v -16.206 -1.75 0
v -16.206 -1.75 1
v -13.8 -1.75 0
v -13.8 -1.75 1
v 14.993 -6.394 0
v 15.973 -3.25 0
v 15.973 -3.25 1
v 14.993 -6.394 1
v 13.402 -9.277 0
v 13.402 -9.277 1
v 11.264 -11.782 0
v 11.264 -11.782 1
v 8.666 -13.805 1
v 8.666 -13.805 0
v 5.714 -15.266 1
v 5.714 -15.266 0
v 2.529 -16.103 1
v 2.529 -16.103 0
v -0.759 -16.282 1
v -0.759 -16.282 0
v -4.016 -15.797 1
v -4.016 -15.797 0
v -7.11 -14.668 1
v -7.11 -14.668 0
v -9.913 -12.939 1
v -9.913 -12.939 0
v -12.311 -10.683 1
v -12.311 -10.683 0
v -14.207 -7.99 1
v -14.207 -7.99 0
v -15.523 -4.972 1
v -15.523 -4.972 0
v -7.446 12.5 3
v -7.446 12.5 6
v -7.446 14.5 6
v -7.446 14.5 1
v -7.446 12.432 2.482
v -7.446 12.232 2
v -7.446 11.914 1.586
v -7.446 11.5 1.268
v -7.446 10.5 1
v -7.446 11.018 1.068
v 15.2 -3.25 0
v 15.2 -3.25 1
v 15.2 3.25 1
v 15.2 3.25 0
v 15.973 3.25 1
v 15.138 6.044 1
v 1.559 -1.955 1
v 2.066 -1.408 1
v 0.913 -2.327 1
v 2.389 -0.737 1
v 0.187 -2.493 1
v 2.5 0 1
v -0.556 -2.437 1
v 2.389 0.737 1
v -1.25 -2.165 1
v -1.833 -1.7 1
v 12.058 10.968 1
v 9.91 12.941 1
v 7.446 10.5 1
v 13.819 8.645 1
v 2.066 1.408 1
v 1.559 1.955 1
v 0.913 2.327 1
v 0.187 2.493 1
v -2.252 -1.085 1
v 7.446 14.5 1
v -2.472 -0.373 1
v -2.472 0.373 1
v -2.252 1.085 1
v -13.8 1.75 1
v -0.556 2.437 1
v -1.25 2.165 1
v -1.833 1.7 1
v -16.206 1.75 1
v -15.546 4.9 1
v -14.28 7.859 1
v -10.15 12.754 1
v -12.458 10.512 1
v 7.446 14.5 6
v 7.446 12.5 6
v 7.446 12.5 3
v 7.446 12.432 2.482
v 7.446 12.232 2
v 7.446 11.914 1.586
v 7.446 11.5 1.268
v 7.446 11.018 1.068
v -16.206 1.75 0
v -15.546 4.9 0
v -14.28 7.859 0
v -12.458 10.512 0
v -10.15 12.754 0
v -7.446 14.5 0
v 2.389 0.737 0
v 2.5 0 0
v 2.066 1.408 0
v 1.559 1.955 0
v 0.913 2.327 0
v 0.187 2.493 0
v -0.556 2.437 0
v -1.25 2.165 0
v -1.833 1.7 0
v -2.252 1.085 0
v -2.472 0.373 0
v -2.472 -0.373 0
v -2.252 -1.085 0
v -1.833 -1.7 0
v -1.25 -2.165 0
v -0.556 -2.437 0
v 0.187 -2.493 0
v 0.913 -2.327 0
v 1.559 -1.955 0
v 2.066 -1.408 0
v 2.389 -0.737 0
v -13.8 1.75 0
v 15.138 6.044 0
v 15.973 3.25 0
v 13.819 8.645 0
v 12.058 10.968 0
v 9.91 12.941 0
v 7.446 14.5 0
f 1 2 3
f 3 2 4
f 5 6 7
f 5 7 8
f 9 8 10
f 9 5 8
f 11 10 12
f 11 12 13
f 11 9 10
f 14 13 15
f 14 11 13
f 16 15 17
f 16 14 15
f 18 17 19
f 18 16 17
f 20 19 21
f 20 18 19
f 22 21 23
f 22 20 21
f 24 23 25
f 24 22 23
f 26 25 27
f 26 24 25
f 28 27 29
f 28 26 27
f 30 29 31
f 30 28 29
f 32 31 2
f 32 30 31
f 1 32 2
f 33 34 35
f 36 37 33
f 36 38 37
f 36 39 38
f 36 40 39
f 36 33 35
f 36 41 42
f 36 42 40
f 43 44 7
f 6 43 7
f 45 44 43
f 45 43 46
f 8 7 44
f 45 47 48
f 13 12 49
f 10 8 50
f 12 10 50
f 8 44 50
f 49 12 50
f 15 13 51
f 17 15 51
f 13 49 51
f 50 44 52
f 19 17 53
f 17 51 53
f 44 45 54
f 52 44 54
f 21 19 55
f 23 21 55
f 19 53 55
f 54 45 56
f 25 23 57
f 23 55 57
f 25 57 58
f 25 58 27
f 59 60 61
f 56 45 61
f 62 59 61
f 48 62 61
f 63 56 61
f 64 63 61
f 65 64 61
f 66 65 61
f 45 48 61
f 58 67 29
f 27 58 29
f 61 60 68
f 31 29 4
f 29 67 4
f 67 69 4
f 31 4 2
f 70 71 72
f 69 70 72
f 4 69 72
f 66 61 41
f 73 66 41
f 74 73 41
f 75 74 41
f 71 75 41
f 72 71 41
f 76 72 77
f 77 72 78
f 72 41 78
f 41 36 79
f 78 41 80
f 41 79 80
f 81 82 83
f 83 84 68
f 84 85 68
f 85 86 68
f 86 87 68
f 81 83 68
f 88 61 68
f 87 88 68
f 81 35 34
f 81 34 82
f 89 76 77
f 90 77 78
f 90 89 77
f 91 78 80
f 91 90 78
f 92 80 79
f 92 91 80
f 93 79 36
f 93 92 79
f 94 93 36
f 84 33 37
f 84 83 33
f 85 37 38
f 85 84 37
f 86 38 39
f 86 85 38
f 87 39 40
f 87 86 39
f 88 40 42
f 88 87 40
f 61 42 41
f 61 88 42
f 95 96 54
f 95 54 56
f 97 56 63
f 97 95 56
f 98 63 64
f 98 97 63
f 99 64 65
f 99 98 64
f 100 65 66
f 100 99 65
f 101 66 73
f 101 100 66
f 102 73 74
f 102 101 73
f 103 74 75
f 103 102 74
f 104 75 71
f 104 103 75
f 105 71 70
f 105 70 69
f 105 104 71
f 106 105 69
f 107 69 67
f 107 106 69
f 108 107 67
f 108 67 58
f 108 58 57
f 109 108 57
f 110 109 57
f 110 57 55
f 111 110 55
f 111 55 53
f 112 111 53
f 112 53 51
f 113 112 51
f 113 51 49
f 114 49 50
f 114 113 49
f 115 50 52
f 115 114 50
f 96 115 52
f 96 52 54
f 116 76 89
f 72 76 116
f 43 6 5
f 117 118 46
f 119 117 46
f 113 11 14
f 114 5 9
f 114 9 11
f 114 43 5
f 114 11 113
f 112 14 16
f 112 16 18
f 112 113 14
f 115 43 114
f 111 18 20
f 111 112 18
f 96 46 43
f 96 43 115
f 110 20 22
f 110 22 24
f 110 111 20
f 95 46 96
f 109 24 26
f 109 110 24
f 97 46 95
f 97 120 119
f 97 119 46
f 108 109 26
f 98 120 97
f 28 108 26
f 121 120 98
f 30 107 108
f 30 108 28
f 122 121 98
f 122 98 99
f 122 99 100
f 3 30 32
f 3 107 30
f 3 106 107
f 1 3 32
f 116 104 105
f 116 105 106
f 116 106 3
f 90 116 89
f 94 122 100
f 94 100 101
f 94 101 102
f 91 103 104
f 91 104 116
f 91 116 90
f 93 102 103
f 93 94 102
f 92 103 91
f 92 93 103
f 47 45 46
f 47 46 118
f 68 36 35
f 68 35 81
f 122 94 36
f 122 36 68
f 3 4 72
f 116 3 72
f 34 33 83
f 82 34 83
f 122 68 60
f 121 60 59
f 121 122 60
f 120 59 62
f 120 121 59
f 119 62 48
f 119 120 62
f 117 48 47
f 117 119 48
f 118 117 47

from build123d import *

# Parameters (mm, degrees)
SKETCH_1_R          = 2.5
EXTRUDE_1_DEPTH     = 1
SKETCH_2_W          = 5
SKETCH_2_H          = 3.5
SKETCH_2_W_2        = 2
SKETCH_2_H_2        = 6.5
CUT_EXTRUDE_1_DEPTH = 2
SKETCH_3_W          = 14.891608376
SKETCH_3_H          = 2
EXTRUDE_2_DEPTH     = 5
FILLET_1_R          = 2


with BuildPart() as part:
    # 草图1 → 凸台-拉伸1 (new body)
    with BuildSketch(Plane.XY):
        with BuildLine():
            Line((-7.445804188, 14.5), (7.445804188, 14.5))
            ThreePointArc((7.445804188, 14.5), (0, -16.3), (-7.445804188, 14.5))
        make_face()
        Circle(SKETCH_1_R, mode=Mode.SUBTRACT)
    extrude(amount=EXTRUDE_1_DEPTH)

    # 草图2 → 切除-拉伸1 (cut, through all)
    with BuildSketch(Plane.XY.offset(1)):
        with Locations((-16.3, 0)):
            Rectangle(SKETCH_2_W, SKETCH_2_H)
        with Locations((16.2, 0)):
            Rectangle(SKETCH_2_W_2, SKETCH_2_H_2)
    extrude(amount=-CUT_EXTRUDE_1_DEPTH, mode=Mode.SUBTRACT)

    # 草图3 → 凸台-拉伸2 (add)
    with BuildSketch(Plane.XY.offset(1)):
        with Locations((0, 13.5)):
            Rectangle(SKETCH_3_W, SKETCH_3_H)
    extrude(amount=EXTRUDE_2_DEPTH)

    # 圆角1
    fillet_1_edges = [part.edges().sort_by_distance(p)[0] for p in [
        (0, 12.5, 1),
    ]]
    fillet(fillet_1_edges, radius=FILLET_1_R)


solid = part.part
